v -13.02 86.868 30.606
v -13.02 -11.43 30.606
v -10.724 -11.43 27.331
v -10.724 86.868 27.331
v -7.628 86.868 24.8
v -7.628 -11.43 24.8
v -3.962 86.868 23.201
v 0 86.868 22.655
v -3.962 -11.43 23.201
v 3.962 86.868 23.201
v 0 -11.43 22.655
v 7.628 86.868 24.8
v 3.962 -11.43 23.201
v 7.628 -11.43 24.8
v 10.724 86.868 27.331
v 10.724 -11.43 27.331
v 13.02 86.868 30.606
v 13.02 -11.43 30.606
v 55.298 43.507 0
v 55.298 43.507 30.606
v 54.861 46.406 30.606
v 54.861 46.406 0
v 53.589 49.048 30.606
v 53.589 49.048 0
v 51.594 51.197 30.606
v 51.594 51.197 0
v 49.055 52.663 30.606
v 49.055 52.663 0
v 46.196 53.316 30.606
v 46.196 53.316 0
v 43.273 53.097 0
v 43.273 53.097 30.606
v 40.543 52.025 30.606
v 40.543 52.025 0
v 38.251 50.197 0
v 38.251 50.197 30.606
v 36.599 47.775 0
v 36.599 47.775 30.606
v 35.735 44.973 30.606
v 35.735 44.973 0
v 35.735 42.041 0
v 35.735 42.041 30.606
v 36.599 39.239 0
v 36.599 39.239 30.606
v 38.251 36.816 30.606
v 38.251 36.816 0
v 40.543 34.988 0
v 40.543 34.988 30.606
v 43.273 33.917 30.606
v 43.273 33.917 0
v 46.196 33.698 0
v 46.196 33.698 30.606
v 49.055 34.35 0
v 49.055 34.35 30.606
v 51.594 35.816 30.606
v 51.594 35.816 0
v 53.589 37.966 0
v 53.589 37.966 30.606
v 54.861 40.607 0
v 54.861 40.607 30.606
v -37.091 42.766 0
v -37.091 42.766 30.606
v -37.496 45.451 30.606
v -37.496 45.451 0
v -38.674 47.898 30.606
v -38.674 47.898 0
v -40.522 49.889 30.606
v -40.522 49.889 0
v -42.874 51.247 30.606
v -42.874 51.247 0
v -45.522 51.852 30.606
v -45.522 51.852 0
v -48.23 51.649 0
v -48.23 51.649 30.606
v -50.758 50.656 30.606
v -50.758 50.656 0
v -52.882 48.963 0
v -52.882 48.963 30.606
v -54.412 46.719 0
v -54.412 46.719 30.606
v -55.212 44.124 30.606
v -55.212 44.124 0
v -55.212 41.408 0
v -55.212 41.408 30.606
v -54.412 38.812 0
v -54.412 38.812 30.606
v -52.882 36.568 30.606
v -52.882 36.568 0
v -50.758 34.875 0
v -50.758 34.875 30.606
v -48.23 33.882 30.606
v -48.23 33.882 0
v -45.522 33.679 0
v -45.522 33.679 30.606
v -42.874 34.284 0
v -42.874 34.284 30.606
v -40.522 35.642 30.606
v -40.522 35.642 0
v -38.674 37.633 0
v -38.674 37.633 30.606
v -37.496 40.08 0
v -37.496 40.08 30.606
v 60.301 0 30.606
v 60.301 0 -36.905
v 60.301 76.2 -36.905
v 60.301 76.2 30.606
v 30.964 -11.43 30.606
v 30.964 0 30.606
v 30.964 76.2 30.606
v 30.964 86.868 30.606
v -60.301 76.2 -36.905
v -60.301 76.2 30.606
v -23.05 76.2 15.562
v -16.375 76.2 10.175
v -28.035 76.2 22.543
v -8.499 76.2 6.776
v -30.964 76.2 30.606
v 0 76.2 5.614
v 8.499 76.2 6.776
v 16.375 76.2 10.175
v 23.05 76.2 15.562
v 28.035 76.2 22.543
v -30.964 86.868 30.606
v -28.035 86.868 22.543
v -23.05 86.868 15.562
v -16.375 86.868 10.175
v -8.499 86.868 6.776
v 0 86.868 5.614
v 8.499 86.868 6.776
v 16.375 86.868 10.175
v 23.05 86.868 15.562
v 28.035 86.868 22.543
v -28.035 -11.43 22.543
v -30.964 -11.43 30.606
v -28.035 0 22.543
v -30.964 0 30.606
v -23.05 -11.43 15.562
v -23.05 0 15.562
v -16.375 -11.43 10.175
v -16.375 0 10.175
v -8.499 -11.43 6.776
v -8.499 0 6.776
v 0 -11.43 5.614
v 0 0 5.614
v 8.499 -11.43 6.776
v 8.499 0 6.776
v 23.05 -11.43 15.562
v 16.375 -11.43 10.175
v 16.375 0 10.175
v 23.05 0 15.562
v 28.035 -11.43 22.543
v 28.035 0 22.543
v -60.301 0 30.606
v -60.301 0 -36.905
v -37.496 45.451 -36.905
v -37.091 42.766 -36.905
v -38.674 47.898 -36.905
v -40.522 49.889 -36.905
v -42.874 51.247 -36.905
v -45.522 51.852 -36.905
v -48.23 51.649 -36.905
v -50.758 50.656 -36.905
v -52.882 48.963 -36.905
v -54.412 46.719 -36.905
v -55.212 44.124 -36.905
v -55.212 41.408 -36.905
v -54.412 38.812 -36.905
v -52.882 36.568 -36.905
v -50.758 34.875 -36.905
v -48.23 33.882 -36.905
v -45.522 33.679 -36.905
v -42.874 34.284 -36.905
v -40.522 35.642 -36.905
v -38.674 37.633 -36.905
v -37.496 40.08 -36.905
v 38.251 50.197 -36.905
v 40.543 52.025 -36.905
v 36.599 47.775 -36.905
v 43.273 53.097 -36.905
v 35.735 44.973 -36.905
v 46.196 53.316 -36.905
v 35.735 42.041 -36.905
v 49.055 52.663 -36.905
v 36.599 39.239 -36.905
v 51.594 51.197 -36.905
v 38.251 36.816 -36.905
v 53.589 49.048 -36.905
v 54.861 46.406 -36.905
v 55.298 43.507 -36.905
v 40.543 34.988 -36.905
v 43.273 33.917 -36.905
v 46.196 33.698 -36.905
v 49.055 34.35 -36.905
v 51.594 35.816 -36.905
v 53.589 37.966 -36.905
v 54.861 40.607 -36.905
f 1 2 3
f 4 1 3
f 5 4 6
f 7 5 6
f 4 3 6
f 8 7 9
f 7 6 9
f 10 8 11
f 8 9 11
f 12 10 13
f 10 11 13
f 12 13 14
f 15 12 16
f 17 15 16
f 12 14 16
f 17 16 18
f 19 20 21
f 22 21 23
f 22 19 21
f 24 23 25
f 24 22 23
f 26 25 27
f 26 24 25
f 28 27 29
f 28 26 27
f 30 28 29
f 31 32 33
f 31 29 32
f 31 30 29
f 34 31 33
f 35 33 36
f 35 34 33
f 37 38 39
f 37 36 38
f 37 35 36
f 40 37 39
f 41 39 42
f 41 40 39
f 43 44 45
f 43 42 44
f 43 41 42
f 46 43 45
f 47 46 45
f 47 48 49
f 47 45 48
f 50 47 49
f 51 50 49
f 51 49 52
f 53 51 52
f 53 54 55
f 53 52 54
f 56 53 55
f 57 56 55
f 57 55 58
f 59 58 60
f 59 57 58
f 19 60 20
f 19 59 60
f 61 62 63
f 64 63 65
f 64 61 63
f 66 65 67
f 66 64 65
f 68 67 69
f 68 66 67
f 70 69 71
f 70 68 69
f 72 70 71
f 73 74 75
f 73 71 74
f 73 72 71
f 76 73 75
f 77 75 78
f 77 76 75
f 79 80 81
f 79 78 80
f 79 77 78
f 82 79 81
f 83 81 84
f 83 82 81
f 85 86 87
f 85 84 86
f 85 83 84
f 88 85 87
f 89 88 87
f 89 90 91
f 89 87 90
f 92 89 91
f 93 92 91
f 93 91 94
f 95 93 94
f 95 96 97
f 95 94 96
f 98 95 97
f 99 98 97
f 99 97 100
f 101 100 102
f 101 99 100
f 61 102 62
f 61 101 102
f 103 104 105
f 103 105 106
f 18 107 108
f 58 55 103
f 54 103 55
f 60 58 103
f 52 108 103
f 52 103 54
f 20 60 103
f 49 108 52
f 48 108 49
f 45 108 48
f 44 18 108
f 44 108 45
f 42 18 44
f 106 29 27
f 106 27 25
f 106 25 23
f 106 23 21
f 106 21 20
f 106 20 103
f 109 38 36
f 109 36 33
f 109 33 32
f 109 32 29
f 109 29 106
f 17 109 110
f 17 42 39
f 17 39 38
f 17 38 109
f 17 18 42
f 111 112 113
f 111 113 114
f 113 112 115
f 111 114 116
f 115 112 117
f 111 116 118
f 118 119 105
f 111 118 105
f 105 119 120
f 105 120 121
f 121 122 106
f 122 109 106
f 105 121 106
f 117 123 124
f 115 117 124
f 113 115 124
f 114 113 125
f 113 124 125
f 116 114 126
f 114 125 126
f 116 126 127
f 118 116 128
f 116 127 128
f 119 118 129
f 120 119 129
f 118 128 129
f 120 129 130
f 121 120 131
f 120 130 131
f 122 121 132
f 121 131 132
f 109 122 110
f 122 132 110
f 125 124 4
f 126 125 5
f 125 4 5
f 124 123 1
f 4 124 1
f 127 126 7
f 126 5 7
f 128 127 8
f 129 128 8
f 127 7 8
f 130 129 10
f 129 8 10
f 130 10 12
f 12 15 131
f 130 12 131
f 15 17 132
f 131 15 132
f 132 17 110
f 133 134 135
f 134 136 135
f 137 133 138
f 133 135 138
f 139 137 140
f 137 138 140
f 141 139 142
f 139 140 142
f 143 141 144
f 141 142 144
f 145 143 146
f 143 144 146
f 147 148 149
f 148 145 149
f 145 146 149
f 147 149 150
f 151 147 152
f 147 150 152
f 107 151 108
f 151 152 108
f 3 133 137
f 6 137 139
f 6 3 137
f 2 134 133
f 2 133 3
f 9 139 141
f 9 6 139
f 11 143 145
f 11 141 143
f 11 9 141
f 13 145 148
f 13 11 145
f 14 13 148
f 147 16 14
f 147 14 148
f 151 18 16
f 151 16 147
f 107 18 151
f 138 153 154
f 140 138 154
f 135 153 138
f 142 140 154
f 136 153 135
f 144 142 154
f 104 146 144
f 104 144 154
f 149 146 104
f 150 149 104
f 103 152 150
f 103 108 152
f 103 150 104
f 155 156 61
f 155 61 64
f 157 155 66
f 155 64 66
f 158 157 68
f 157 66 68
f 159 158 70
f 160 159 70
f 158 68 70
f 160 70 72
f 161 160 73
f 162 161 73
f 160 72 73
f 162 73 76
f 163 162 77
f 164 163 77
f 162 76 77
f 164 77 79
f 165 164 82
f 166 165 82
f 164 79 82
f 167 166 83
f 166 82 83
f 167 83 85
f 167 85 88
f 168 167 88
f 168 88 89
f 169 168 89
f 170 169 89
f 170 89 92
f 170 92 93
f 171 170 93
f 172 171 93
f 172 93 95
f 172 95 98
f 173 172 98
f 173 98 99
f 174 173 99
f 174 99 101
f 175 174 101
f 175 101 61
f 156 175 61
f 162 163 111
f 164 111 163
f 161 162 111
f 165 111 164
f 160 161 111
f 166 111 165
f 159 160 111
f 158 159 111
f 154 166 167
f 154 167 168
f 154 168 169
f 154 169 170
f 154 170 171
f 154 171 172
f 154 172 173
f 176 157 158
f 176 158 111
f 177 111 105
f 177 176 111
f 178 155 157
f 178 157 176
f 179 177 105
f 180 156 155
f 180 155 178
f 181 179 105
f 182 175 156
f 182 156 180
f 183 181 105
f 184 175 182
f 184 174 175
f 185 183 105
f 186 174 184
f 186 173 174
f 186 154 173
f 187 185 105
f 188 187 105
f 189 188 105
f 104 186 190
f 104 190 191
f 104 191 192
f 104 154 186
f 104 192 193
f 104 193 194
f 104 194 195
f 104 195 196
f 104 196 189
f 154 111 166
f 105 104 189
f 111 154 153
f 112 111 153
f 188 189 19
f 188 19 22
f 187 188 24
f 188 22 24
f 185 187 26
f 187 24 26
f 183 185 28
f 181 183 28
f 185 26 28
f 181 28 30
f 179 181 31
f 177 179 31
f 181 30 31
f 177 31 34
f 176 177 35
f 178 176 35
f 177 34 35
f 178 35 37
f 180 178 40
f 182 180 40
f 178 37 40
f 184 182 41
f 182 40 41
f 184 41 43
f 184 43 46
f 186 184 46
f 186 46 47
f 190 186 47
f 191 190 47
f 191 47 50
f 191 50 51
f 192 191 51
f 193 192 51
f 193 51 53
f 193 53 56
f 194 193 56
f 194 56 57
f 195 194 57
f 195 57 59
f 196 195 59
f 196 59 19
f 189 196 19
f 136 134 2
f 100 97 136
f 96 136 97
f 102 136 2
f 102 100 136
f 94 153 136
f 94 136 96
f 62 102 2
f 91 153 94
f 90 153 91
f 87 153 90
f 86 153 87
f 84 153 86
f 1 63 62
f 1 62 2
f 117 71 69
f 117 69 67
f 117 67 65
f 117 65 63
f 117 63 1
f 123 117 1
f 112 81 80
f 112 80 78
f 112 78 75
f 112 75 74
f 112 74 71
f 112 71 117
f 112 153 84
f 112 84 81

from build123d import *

# Parameters (mm, degrees)
F0_W          = 120.6022500992
F0_H          = 73.8097429276
F1_DEPTH      = 76.2
F2_R          = 31.6774975882
F3_DEPTH      = 86.868
F3_DEPTH_BACK = 11.43
F4_W          = 119.1478464752
F4_H          = 40.1731412858
F5_DEPTH      = 60.3021250496
F5_DEPTH_BACK = 60.3021250496
F6_R          = 14.6367961648
F7_DEPTH      = 86.869
F7_DEPTH_BACK = 25.4
F8_R          = 9.1115926715
F8_R_2        = 9.8364729175
F9_DEPTH      = 30.6065564433
F9_DEPTH_BACK = 36.9058714638


with BuildPart() as f1:
    # F0 (on Front) → F1 (new body)
    with BuildSketch(Plane.XZ):
        Rectangle(F0_W, F0_H)
    extrude(amount=-F1_DEPTH)

    # F2 (on Front) → F3 (join, two sides)
    with BuildSketch(Plane.XZ) as f3_sk:
        with Locations((0, 37.2918173671)):
            Circle(F2_R)
    extrude(amount=-F3_DEPTH)
    extrude(f3_sk.sketch, amount=F3_DEPTH_BACK)

    # F4 (on Right) → F5 (cut, two sides)
    with BuildSketch(Plane.YZ) as f5_sk:
        with Locations((41.5653018281, 50.6921270862)):
            Rectangle(F4_W, F4_H)
    extrude(amount=-F5_DEPTH, mode=Mode.SUBTRACT)
    extrude(f5_sk.sketch, amount=F5_DEPTH_BACK, mode=Mode.SUBTRACT)

    # F6 (on Front) → F7 (cut, two sides)
    with BuildSketch(Plane.XZ) as f7_sk:
        with Locations((0, 37.2918173671)):
            Circle(F6_R)
    extrude(amount=-F7_DEPTH, mode=Mode.SUBTRACT)
    extrude(f7_sk.sketch, amount=F7_DEPTH_BACK, mode=Mode.SUBTRACT)

    # F8 (on Top) → F9 (cut, two sides)
    with BuildSketch(Plane.XY) as f9_sk:
        with Locations((-46.2026000023, 42.7655205131)):
            Circle(F8_R)
        with Locations((45.4613789916, 43.5067377985)):
            Circle(F8_R_2)
    extrude(amount=F9_DEPTH, mode=Mode.SUBTRACT)
    extrude(f9_sk.sketch, amount=-F9_DEPTH_BACK, mode=Mode.SUBTRACT)


solid = f1.part
